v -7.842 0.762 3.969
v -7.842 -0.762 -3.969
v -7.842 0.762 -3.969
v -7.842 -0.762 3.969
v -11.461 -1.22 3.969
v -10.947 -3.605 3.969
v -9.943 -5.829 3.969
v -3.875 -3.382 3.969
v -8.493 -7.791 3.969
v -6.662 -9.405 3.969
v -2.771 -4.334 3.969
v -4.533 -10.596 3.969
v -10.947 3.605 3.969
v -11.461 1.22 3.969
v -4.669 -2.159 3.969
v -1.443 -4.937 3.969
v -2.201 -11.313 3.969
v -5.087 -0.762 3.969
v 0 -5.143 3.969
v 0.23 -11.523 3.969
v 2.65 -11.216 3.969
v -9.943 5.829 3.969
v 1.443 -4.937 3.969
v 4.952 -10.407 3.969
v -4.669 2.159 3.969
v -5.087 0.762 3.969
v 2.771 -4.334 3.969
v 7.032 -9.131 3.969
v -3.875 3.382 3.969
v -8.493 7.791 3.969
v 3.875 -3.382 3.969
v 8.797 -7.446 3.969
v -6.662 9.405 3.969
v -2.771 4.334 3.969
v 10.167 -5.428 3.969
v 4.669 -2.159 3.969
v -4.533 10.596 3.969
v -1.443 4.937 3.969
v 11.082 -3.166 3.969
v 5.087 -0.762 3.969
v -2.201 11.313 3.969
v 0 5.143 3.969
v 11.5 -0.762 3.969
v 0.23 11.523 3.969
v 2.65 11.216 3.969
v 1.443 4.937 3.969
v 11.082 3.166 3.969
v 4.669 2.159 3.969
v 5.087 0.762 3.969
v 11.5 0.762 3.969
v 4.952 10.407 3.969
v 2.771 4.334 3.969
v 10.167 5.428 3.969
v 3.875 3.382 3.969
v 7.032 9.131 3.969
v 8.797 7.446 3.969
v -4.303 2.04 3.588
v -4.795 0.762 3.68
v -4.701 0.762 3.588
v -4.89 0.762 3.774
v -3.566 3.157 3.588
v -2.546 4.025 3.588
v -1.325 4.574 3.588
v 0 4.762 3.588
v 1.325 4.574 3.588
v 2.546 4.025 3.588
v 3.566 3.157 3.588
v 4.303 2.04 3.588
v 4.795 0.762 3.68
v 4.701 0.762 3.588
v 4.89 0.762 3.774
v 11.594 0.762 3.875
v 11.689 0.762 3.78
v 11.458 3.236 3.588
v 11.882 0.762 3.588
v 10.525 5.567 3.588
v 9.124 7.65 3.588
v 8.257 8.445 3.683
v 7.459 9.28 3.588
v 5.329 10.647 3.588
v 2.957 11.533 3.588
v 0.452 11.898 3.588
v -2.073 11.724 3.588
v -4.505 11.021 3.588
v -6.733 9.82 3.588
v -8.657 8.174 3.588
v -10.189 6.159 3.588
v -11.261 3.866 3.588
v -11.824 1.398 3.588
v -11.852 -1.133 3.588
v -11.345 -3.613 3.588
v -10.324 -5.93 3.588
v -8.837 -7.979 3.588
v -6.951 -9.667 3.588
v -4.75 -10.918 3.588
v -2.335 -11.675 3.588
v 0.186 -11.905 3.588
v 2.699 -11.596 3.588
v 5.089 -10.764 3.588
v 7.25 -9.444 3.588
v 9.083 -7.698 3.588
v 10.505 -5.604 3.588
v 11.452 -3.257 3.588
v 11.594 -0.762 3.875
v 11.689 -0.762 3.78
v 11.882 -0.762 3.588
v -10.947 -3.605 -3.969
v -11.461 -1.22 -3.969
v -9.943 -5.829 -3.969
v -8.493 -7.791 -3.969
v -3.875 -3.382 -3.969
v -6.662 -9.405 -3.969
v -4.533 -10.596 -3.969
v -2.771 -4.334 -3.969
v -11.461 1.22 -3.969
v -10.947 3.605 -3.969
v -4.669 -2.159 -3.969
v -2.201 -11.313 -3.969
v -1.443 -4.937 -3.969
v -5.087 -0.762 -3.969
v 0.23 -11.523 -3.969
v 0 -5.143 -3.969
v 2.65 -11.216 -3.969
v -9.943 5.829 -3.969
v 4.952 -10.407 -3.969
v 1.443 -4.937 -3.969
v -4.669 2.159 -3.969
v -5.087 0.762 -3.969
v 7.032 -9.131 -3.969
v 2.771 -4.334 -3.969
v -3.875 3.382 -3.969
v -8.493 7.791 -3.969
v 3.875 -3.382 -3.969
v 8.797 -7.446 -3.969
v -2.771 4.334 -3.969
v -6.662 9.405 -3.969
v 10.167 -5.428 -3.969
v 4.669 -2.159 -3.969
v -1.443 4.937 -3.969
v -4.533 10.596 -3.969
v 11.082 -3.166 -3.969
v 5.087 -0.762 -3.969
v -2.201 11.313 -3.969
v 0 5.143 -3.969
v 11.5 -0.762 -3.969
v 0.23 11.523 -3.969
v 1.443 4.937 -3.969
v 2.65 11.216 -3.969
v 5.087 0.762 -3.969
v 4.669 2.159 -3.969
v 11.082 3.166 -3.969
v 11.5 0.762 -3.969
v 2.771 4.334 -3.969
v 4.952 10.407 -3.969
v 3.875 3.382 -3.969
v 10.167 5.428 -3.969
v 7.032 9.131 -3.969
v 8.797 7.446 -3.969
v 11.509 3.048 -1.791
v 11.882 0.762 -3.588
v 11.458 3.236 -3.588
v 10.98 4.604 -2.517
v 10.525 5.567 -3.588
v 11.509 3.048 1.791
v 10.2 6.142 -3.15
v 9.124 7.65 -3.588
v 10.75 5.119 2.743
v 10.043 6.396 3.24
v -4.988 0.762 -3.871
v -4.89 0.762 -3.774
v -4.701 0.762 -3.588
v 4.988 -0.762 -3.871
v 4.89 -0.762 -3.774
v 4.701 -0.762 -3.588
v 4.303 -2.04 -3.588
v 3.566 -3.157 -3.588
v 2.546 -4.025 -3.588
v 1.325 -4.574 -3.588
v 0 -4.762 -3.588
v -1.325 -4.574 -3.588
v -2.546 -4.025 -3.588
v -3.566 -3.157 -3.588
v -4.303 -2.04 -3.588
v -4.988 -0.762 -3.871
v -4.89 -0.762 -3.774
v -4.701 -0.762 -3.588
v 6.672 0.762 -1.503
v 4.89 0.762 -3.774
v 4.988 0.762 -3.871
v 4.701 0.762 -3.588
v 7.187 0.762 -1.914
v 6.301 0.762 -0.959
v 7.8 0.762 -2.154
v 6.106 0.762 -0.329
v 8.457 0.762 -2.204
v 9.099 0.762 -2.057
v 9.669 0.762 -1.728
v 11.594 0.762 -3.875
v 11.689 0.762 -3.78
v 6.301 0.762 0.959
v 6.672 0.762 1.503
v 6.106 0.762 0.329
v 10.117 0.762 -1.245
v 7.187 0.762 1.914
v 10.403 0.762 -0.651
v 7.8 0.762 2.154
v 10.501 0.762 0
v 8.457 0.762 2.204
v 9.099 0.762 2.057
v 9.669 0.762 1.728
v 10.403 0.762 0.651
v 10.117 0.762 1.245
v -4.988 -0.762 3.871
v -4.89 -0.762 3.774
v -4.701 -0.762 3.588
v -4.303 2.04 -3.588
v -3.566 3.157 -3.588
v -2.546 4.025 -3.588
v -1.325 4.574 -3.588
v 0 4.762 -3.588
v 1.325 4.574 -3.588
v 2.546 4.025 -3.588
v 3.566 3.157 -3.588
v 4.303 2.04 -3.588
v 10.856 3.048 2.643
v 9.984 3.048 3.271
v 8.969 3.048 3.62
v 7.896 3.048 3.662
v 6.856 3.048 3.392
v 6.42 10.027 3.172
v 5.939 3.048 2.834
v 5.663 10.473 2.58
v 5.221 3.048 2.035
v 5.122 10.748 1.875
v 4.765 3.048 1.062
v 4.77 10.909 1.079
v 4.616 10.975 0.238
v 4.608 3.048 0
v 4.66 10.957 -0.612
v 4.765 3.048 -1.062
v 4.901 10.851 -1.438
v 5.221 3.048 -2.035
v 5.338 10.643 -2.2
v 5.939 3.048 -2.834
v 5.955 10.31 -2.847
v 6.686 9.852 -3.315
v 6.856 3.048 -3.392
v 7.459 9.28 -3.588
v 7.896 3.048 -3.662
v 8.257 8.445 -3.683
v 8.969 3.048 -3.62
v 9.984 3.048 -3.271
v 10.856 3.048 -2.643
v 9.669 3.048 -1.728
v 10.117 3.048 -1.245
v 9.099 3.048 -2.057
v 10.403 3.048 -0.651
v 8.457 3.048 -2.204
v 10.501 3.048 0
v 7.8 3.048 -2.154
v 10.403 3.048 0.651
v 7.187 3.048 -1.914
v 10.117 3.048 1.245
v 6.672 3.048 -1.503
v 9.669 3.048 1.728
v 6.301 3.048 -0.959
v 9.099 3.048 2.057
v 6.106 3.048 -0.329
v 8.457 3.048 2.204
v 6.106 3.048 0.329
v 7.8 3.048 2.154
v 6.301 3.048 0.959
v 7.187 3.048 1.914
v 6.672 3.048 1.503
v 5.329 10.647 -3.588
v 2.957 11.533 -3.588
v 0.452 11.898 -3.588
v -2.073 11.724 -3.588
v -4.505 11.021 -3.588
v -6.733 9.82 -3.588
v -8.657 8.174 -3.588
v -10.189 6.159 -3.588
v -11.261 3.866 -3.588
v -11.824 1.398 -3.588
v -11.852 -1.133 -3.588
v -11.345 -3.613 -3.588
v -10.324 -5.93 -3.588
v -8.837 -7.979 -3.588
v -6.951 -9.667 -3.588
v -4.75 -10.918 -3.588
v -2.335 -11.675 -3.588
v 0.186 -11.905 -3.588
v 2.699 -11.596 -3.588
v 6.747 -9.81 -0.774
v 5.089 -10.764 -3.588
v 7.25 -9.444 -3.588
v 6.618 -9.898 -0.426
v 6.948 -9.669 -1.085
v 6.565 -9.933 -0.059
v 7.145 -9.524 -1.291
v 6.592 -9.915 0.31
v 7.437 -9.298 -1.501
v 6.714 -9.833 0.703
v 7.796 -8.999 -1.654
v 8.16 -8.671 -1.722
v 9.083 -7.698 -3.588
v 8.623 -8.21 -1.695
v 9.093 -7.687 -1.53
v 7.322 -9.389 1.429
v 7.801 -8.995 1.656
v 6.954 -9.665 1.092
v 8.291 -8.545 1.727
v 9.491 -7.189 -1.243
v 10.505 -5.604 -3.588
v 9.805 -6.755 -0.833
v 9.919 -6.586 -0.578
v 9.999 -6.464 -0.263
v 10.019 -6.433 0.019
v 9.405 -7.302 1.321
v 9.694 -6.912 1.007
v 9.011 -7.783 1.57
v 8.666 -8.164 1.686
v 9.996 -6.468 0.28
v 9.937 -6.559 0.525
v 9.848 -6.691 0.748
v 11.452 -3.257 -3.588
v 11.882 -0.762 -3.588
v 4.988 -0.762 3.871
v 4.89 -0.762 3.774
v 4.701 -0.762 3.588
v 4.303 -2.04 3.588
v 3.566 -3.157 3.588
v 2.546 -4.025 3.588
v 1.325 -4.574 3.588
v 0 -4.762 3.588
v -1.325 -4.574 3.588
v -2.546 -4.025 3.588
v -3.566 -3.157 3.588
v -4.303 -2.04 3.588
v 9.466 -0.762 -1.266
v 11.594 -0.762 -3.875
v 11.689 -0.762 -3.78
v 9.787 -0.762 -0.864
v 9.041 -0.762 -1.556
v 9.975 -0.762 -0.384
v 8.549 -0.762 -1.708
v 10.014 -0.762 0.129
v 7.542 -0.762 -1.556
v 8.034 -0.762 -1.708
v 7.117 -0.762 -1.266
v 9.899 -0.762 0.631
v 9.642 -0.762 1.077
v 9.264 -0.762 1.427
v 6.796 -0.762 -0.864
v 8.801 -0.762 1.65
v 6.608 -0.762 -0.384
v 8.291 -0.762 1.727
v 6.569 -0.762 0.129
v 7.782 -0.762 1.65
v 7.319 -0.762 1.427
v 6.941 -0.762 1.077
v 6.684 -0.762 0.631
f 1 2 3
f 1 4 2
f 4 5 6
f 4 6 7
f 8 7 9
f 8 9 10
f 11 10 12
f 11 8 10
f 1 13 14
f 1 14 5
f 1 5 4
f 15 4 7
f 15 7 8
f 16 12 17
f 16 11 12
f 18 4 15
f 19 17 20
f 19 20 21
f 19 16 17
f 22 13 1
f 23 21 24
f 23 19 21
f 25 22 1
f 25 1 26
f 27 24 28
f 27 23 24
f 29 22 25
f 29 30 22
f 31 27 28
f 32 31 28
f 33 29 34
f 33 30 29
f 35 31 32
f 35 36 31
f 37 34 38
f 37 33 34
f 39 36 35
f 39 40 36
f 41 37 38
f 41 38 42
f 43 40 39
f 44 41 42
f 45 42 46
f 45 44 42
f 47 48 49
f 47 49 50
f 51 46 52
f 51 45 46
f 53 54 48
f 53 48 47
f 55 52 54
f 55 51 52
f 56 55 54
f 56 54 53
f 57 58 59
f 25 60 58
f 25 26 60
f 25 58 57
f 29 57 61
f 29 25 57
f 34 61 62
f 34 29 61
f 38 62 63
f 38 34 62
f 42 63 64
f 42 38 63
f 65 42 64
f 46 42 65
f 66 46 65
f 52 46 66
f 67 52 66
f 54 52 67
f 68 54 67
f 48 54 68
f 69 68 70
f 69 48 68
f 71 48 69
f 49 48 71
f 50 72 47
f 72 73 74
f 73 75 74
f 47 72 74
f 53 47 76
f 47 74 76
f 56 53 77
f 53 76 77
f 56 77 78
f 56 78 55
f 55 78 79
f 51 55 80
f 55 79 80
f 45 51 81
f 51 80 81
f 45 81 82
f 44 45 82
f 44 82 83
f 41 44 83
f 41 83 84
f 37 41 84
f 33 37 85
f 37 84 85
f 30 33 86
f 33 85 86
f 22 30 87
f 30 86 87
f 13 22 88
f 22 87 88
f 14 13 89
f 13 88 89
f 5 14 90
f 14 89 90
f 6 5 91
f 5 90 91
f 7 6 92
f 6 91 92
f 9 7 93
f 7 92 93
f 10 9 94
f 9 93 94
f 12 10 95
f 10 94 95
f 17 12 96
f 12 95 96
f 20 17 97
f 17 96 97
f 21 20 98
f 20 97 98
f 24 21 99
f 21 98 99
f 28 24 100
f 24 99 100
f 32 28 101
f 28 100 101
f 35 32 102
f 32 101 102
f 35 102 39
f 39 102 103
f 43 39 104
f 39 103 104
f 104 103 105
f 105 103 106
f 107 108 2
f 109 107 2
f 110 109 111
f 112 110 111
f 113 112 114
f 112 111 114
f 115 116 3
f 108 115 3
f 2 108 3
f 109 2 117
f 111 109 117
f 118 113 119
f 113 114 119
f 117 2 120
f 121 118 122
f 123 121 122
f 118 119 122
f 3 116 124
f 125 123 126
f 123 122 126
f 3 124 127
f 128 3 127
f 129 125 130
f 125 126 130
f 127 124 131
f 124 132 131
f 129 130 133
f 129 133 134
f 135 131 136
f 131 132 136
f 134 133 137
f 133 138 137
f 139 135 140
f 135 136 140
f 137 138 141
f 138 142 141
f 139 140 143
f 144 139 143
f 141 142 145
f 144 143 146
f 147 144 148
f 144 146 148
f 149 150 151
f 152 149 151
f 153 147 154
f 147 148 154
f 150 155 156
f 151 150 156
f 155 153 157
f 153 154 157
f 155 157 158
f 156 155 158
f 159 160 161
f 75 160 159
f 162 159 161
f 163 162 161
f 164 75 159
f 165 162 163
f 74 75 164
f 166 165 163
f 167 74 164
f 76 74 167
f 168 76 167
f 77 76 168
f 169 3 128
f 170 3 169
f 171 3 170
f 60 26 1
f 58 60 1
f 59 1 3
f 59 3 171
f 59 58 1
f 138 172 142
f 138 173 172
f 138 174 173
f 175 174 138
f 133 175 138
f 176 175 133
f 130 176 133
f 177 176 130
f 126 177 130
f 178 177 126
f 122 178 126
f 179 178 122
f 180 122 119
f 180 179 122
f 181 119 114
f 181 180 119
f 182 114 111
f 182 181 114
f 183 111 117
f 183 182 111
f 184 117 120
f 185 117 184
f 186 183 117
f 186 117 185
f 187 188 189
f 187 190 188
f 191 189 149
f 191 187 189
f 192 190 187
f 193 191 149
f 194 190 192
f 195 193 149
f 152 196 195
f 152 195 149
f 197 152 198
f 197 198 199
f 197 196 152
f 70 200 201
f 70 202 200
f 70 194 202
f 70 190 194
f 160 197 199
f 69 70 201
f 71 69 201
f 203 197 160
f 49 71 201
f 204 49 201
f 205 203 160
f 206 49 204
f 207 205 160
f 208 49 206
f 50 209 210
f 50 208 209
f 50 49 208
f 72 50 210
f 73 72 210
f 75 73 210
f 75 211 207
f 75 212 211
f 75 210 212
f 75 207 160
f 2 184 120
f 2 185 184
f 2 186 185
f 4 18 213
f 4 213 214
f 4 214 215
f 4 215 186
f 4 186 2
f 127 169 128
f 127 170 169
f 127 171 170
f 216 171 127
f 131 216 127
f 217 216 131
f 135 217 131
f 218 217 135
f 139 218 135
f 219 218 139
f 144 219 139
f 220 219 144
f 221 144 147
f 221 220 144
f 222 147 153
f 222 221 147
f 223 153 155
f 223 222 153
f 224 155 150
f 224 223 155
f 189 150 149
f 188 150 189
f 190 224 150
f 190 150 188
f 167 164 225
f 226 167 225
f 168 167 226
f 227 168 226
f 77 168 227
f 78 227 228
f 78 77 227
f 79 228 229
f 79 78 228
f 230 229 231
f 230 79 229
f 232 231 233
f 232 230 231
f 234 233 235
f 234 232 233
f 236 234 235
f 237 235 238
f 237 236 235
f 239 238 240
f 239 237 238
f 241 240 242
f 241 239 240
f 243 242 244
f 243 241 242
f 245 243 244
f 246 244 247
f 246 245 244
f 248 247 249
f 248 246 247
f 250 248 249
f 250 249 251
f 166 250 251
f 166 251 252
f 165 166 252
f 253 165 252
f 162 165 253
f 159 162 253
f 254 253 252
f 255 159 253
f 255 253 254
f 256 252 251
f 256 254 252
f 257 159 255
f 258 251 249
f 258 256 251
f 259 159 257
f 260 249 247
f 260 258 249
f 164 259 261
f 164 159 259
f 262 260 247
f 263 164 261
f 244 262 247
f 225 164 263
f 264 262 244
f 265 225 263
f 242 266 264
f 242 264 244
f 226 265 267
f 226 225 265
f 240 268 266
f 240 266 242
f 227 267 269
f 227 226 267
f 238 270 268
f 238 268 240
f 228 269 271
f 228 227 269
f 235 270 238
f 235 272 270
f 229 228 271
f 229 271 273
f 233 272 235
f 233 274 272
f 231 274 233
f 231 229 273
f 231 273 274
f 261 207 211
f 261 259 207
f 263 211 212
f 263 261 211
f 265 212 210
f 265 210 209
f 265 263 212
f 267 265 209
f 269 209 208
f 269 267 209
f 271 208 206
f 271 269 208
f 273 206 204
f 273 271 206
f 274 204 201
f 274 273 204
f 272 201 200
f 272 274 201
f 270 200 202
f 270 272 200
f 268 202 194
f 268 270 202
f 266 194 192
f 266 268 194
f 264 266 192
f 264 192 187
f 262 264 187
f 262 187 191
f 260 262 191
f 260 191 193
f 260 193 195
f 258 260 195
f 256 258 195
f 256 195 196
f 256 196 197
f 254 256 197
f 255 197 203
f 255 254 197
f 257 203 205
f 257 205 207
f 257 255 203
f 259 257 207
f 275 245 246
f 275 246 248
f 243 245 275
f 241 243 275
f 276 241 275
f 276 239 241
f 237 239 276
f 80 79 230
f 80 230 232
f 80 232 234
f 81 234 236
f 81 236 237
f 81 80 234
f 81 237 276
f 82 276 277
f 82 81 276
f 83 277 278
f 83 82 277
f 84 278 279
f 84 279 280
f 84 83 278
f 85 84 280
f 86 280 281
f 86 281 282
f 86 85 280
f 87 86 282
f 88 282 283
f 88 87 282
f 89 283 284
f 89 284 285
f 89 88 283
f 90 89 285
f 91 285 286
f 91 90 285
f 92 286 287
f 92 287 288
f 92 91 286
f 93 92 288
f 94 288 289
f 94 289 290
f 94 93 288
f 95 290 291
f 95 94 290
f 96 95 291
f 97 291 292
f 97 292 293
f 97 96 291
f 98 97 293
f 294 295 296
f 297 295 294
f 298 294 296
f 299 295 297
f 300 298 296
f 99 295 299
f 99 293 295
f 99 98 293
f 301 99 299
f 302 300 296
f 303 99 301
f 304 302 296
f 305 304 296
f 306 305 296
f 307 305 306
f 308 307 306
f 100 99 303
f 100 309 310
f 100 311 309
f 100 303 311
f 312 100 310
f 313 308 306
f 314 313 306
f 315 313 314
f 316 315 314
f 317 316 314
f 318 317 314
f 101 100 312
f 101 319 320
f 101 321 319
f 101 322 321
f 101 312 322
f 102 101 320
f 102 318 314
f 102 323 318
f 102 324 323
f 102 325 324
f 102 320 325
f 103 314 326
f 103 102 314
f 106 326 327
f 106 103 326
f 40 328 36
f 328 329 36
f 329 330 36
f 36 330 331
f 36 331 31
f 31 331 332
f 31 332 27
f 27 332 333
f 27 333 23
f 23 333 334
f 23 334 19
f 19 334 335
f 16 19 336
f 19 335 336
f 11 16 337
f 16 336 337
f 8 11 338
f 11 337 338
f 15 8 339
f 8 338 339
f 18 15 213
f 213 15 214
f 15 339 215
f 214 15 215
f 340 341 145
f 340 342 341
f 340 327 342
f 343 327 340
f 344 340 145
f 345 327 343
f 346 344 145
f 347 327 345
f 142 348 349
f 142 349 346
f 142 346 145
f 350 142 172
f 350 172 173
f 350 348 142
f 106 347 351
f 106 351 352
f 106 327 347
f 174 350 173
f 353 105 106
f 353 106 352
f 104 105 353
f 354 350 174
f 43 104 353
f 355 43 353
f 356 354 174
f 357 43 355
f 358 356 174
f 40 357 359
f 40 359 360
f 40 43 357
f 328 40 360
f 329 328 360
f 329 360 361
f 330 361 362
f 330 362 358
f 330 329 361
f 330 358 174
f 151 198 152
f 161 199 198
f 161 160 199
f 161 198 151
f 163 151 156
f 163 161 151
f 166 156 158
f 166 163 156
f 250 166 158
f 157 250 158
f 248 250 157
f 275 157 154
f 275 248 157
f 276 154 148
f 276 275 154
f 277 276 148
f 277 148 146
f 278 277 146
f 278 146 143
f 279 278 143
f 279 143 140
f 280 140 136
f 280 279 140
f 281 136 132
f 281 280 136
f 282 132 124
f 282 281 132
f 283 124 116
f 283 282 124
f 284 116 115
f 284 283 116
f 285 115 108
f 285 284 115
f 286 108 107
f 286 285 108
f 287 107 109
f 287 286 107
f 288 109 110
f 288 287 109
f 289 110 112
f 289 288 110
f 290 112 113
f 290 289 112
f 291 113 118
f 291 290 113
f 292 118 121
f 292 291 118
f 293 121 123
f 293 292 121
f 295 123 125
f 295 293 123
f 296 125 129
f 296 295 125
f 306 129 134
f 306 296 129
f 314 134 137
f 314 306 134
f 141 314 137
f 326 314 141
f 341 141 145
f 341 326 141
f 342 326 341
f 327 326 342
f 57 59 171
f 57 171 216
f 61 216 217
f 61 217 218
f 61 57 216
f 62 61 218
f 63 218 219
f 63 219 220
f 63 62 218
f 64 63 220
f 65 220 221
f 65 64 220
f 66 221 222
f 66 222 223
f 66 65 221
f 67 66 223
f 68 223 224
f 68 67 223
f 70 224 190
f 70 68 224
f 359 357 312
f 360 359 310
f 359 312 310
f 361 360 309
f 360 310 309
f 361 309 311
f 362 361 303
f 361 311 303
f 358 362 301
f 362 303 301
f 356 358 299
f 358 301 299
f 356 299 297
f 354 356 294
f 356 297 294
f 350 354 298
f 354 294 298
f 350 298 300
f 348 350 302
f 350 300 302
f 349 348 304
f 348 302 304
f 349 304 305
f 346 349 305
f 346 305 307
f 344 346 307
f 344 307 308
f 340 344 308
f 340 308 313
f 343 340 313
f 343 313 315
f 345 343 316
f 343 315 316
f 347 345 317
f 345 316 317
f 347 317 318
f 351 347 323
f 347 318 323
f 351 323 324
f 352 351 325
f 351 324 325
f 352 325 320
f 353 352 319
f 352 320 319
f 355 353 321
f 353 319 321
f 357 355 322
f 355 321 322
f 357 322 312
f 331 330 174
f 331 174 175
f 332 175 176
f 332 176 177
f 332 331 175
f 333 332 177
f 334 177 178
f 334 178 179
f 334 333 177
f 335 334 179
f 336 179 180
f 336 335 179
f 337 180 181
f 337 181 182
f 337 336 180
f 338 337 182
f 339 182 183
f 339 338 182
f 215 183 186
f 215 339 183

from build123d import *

# Parameters (mm, degrees)
BOSS_EXTRUDE1_DEPTH = 3.96875
SKETCH4_W           = 1.7272
SKETCH4_H           = 11.14425
CHAMFER1_SIZE       = 0.381


with BuildPart() as part:
    # Sketch1 → Boss-Extrude1 (new body, symmetric)
    with BuildSketch(Plane.XY):
        with BuildLine():
            Line((-7.84225, 0.762), (-4.701144781, 0.762))
            ThreePointArc((-4.701144781, 0.762), (0, 4.7625), (4.701144781, 0.762))
            Line((4.701144781, 0.762), (11.88184098, 0.762))
            ThreePointArc((11.88184098, 0.762), (-11.90625, 0), (11.88184098, -0.762))
            Line((11.88184098, -0.762), (4.701144781, -0.762))
            ThreePointArc((4.701144781, -0.762), (0, -4.7625), (-4.701144781, -0.762))
            Line((-4.701144781, -0.762), (-7.84225, -0.762))
            Line((-7.84225, -0.762), (-7.84225, 0.762))
        make_face()
    extrude(amount=BOSS_EXTRUDE1_DEPTH, both=True)

    # Sketch4 → #8-32 Tapped Hole1 (revolve, cut)
    with BuildSketch(Plane(origin=(8.29149288, -0.762, 0), x_dir=(0, 0, 1), z_dir=(1, 0, 0))):
        with Locations((0.8636, 5.572125)):
            Rectangle(SKETCH4_W, SKETCH4_H)
    revolve(axis=Axis((8.29149288, 5.588, 0), (0, -1, 0)), mode=Mode.SUBTRACT)

    # Chamfer1
    chamfer1_edges = [part.edges().sort_by_distance(p)[0] for p in [
        (0, -4.7625, -3.96875),
        (0, 4.7625, 3.96875),
        (-11.90625, 0, 3.96875),
        (0, -4.7625, 3.96875),
        (-11.90625, 0, -3.96875),
        (0, 4.7625, -3.96875),
    ]]
    chamfer(chamfer1_edges, length=CHAMFER1_SIZE)

    # Sketch10 → Cut-Revolve1 (revolve, cut)
    with BuildSketch(Plane.XY):
        Polygon((8.29149288, 0.762), (10.50129288, 0.762), (10.50129288, 3.048), (11.97449288, 3.048), (11.97449288, 11.90625), (8.29149288, 11.90625), align=None)
    revolve(axis=Axis((8.29149288, -0.762, 0), (0, -1, 0)), mode=Mode.SUBTRACT)


solid = part.part
